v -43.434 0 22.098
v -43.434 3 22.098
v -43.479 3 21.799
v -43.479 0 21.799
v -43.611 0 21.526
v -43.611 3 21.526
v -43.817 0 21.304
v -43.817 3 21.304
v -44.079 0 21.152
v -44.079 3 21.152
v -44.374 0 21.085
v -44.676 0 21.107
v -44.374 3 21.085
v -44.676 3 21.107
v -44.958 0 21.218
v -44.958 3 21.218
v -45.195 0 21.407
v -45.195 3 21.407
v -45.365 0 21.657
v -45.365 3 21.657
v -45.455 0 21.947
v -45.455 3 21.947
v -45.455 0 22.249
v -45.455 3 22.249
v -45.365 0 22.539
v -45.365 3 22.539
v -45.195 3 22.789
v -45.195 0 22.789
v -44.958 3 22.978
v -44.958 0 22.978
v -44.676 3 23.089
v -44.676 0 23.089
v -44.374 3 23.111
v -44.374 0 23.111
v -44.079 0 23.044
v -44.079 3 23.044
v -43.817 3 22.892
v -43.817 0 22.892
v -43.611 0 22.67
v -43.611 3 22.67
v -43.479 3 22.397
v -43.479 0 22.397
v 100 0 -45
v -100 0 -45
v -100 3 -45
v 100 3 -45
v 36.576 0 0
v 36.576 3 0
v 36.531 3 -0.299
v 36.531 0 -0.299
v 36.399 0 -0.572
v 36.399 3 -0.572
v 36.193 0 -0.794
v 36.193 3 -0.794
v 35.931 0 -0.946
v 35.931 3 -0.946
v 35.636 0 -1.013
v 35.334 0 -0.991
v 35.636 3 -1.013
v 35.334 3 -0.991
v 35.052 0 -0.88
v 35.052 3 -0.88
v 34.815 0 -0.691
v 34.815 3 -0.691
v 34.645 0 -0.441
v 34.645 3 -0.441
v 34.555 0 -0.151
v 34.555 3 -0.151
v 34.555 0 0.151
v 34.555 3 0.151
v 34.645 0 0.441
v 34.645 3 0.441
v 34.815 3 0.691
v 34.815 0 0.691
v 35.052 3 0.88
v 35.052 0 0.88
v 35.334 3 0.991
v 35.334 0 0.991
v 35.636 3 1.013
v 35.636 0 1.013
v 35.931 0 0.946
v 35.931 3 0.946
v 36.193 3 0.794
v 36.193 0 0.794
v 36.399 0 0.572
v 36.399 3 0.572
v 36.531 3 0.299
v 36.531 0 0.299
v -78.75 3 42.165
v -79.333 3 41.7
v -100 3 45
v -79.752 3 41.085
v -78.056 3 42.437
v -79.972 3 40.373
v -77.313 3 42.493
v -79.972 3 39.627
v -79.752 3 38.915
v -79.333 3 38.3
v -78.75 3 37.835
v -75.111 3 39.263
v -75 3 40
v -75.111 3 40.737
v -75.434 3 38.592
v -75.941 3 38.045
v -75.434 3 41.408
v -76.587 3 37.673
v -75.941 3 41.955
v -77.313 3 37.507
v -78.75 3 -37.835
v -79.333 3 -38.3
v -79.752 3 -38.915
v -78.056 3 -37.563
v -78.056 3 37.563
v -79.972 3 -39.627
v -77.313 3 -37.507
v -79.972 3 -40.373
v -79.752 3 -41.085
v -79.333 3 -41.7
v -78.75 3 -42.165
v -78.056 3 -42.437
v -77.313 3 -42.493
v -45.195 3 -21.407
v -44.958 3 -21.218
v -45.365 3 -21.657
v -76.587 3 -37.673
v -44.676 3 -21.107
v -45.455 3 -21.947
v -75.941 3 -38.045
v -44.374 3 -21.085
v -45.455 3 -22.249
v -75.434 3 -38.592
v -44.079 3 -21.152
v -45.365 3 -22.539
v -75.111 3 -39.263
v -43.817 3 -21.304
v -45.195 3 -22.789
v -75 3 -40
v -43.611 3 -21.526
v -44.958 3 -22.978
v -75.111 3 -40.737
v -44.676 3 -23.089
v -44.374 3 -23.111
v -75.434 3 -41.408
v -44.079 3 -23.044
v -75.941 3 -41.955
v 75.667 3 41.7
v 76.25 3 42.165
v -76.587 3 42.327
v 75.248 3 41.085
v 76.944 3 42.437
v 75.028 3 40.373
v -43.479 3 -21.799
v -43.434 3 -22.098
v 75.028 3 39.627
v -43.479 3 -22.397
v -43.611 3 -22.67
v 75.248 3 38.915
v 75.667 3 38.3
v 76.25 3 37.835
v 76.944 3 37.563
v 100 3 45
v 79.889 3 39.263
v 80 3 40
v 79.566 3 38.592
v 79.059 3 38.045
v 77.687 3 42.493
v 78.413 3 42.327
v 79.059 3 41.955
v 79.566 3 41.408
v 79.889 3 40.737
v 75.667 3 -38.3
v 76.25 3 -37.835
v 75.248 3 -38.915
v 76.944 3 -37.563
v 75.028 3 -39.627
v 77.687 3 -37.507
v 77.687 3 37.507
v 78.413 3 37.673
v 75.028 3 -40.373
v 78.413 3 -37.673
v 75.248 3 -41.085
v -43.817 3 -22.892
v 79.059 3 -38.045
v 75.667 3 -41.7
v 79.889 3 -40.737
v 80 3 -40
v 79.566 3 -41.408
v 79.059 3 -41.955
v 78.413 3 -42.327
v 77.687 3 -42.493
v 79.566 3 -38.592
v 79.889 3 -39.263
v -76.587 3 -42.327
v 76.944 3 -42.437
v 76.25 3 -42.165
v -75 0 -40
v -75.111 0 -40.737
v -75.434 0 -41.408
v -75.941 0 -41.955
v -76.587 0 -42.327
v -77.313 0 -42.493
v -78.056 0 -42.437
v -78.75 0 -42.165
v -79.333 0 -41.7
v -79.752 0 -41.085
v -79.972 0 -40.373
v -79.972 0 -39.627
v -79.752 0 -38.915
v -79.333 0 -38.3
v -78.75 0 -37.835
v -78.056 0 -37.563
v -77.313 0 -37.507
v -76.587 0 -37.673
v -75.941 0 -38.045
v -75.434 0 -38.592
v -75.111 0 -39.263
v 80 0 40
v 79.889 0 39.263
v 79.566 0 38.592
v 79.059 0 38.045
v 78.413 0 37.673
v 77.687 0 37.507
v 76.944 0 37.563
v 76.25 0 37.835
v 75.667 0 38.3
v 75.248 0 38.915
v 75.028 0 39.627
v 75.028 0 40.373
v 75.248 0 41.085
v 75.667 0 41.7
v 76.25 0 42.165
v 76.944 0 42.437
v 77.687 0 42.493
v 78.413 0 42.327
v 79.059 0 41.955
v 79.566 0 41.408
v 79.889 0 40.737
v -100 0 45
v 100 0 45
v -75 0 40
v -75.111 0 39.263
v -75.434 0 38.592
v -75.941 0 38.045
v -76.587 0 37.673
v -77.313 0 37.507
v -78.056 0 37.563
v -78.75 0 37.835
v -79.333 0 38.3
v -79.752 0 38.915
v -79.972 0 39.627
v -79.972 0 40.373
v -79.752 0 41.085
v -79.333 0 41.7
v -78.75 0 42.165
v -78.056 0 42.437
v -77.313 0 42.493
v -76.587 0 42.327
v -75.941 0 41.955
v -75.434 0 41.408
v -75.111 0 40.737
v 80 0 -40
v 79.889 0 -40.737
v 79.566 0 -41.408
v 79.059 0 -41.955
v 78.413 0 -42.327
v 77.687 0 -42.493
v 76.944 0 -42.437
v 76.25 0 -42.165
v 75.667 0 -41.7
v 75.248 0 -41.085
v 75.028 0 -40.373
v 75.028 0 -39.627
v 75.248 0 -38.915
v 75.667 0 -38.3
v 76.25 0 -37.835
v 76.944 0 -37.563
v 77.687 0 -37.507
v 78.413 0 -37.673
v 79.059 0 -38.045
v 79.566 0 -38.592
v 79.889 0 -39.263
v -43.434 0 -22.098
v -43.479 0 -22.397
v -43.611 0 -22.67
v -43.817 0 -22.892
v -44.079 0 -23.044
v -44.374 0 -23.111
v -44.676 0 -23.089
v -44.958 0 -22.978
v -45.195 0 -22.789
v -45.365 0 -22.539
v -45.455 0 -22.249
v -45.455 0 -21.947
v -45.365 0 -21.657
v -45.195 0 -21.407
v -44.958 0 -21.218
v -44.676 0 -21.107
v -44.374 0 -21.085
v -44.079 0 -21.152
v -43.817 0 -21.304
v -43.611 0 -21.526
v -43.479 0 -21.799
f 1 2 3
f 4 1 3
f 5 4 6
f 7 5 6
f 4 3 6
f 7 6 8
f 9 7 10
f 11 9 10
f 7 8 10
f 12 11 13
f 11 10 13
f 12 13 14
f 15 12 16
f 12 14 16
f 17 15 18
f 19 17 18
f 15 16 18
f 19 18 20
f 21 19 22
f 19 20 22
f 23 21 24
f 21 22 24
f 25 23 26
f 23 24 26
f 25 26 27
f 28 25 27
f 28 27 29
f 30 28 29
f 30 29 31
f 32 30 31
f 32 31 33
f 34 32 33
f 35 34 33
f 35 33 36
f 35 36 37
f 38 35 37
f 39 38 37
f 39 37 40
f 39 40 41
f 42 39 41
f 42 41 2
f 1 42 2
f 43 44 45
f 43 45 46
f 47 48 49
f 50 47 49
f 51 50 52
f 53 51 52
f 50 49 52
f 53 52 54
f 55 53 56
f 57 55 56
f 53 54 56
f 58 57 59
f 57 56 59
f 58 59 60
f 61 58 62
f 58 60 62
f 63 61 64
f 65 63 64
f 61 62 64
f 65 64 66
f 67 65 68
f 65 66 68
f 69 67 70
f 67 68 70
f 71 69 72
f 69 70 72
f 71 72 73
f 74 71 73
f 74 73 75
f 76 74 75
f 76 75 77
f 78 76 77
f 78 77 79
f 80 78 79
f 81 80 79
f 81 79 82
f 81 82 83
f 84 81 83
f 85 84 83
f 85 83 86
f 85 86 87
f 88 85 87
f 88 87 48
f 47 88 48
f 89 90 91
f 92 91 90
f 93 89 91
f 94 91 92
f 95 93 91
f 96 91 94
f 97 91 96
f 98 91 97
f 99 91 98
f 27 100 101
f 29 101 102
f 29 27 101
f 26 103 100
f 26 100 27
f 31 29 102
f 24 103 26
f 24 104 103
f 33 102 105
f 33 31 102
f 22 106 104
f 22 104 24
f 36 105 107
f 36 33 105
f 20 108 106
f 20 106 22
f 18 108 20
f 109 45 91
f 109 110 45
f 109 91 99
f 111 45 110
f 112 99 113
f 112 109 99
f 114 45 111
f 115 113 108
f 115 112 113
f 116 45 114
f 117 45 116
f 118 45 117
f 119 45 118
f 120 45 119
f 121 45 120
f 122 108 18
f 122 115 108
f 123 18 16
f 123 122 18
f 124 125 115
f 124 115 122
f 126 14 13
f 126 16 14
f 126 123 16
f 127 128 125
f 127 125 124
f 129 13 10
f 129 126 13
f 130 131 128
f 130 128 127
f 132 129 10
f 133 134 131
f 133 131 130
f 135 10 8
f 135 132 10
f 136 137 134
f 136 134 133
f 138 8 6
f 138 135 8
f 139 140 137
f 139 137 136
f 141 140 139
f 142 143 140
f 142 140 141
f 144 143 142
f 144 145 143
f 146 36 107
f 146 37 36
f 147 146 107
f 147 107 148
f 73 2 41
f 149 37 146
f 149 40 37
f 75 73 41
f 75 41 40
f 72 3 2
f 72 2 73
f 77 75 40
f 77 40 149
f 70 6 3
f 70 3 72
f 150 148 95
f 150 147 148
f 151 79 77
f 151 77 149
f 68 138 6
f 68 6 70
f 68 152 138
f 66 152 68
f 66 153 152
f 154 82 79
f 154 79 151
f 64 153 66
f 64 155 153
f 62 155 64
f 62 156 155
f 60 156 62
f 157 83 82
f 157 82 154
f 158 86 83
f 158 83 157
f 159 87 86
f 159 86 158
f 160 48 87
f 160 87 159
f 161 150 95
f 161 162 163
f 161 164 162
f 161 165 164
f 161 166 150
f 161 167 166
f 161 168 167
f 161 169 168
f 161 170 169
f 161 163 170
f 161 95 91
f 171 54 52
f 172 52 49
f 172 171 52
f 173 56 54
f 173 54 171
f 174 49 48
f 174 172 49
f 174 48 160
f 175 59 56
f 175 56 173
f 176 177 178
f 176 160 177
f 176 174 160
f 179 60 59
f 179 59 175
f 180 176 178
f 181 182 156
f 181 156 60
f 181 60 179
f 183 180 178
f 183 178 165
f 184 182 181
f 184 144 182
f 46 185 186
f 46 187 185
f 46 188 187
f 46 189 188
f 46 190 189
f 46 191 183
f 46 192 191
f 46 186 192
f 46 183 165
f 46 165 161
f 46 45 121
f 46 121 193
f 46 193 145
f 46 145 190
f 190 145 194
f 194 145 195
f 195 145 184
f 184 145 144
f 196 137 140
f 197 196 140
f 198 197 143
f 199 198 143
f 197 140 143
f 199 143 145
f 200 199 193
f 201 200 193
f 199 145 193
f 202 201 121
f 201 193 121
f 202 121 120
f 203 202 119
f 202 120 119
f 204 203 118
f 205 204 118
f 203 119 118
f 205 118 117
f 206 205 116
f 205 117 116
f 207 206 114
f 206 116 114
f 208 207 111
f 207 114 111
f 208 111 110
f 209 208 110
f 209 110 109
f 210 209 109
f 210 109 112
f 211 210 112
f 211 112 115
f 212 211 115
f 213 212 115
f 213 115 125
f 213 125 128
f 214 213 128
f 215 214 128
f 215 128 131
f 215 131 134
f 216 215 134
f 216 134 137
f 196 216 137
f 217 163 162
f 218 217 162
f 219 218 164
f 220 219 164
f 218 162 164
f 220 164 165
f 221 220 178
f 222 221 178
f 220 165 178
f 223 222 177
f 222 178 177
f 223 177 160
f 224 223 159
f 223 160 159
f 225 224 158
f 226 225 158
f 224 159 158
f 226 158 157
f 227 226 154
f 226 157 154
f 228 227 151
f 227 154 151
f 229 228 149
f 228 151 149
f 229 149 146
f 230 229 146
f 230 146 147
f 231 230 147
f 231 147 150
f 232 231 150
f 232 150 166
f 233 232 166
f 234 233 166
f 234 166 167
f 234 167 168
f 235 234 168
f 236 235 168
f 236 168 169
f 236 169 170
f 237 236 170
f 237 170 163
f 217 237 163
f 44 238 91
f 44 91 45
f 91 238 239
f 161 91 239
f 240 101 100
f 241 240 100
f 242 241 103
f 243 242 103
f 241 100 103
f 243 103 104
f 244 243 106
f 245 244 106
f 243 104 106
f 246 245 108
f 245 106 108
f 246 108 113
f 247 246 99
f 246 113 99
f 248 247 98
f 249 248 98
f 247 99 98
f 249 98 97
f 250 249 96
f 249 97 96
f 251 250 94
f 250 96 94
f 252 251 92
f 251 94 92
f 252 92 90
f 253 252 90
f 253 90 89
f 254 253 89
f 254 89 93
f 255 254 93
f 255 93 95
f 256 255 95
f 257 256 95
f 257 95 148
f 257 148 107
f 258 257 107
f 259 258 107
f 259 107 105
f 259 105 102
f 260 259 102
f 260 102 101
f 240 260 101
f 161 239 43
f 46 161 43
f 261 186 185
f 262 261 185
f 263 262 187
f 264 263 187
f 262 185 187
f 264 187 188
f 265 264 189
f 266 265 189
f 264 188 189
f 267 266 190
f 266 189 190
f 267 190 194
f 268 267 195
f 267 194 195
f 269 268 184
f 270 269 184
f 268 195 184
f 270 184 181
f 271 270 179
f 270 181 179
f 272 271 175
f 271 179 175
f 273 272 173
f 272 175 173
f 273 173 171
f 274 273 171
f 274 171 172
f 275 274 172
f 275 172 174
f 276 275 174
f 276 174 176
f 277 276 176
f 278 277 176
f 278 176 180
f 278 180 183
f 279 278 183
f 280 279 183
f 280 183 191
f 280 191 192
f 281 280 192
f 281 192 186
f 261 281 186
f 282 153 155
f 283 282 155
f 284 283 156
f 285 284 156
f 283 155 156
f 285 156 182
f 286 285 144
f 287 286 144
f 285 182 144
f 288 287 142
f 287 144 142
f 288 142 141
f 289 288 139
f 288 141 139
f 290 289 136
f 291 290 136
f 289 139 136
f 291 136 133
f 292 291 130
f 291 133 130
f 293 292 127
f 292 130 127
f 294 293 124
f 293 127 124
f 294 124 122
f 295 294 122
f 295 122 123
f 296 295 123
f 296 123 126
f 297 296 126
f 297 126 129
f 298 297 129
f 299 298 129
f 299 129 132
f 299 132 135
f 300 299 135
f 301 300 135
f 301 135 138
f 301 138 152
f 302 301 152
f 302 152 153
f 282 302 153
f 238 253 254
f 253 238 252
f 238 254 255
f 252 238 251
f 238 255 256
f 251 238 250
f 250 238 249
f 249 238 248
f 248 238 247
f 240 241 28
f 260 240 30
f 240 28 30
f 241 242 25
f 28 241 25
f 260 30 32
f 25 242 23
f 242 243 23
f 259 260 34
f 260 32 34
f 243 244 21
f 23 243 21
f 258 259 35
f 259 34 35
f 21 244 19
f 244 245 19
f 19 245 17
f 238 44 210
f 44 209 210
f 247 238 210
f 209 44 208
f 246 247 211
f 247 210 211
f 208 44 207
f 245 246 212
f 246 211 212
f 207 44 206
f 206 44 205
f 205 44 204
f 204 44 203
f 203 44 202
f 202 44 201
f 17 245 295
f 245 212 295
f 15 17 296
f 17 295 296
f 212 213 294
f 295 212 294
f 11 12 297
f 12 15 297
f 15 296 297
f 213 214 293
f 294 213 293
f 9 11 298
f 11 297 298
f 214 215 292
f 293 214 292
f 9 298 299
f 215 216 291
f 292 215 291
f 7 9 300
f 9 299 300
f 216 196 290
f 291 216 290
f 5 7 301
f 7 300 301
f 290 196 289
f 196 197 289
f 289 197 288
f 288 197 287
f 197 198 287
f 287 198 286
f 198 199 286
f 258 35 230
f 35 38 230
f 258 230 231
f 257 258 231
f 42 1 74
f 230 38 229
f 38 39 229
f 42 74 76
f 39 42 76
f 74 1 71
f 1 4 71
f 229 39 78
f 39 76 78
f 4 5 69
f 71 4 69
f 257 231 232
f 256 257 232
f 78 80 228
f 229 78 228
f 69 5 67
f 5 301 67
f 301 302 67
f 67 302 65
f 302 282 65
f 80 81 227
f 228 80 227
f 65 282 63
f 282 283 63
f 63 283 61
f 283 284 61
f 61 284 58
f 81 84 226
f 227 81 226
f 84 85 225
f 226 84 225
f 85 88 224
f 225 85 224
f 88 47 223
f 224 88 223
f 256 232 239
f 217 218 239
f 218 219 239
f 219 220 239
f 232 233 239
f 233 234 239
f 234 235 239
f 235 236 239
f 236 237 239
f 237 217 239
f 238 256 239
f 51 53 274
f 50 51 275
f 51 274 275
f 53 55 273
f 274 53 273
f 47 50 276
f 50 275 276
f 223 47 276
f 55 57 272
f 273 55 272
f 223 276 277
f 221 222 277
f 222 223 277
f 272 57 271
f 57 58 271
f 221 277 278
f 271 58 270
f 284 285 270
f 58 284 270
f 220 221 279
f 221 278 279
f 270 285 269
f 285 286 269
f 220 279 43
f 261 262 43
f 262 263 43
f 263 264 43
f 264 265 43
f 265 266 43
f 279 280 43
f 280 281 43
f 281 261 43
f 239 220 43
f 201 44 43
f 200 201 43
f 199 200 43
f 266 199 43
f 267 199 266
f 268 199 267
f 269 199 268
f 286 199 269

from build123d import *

# Parameters (mm, degrees)
SKETCH1_W           = 200
SKETCH1_H           = 90
BOSS_EXTRUDE1_DEPTH = 3
SKETCH2_R           = 2.5
CUT_EXTRUDE1_DEPTH  = 4
SKETCH3_R           = 1.016
CUT_EXTRUDE2_DEPTH  = 4


with BuildPart() as part:
    # Sketch1 → Boss-Extrude1 (new body)
    with BuildSketch(Plane(origin=(0, 0, 0), x_dir=(1, 0, 0), z_dir=(0, 1, 0))):
        Rectangle(SKETCH1_W, SKETCH1_H)
    extrude(amount=BOSS_EXTRUDE1_DEPTH)

    # Sketch2 → Cut-Extrude1 (cut, through all)
    with BuildSketch(Plane(origin=(0, 3, 0), x_dir=(1, 0, 0), z_dir=(0, 1, 0))):
        with Locations((-77.5, 40)):
            Circle(SKETCH2_R)
        with Locations((77.5, 40)):
            Circle(SKETCH2_R)
        with Locations((77.5, -40)):
            Circle(SKETCH2_R)
        with Locations((-77.5, -40)):
            Circle(SKETCH2_R)
    extrude(amount=-CUT_EXTRUDE1_DEPTH, mode=Mode.SUBTRACT)

    # Sketch3 → Cut-Extrude2 (cut, through all)
    with BuildSketch(Plane(origin=(0, 3, 0), x_dir=(1, 0, 0), z_dir=(0, 1, 0))):
        with Locations((-44.45, 22.098)):
            Circle(SKETCH3_R)
        with Locations((-44.45, -22.098)):
            Circle(SKETCH3_R)
        with Locations((35.56, 0)):
            Circle(SKETCH3_R)
    extrude(amount=-CUT_EXTRUDE2_DEPTH, mode=Mode.SUBTRACT)


solid = part.part
